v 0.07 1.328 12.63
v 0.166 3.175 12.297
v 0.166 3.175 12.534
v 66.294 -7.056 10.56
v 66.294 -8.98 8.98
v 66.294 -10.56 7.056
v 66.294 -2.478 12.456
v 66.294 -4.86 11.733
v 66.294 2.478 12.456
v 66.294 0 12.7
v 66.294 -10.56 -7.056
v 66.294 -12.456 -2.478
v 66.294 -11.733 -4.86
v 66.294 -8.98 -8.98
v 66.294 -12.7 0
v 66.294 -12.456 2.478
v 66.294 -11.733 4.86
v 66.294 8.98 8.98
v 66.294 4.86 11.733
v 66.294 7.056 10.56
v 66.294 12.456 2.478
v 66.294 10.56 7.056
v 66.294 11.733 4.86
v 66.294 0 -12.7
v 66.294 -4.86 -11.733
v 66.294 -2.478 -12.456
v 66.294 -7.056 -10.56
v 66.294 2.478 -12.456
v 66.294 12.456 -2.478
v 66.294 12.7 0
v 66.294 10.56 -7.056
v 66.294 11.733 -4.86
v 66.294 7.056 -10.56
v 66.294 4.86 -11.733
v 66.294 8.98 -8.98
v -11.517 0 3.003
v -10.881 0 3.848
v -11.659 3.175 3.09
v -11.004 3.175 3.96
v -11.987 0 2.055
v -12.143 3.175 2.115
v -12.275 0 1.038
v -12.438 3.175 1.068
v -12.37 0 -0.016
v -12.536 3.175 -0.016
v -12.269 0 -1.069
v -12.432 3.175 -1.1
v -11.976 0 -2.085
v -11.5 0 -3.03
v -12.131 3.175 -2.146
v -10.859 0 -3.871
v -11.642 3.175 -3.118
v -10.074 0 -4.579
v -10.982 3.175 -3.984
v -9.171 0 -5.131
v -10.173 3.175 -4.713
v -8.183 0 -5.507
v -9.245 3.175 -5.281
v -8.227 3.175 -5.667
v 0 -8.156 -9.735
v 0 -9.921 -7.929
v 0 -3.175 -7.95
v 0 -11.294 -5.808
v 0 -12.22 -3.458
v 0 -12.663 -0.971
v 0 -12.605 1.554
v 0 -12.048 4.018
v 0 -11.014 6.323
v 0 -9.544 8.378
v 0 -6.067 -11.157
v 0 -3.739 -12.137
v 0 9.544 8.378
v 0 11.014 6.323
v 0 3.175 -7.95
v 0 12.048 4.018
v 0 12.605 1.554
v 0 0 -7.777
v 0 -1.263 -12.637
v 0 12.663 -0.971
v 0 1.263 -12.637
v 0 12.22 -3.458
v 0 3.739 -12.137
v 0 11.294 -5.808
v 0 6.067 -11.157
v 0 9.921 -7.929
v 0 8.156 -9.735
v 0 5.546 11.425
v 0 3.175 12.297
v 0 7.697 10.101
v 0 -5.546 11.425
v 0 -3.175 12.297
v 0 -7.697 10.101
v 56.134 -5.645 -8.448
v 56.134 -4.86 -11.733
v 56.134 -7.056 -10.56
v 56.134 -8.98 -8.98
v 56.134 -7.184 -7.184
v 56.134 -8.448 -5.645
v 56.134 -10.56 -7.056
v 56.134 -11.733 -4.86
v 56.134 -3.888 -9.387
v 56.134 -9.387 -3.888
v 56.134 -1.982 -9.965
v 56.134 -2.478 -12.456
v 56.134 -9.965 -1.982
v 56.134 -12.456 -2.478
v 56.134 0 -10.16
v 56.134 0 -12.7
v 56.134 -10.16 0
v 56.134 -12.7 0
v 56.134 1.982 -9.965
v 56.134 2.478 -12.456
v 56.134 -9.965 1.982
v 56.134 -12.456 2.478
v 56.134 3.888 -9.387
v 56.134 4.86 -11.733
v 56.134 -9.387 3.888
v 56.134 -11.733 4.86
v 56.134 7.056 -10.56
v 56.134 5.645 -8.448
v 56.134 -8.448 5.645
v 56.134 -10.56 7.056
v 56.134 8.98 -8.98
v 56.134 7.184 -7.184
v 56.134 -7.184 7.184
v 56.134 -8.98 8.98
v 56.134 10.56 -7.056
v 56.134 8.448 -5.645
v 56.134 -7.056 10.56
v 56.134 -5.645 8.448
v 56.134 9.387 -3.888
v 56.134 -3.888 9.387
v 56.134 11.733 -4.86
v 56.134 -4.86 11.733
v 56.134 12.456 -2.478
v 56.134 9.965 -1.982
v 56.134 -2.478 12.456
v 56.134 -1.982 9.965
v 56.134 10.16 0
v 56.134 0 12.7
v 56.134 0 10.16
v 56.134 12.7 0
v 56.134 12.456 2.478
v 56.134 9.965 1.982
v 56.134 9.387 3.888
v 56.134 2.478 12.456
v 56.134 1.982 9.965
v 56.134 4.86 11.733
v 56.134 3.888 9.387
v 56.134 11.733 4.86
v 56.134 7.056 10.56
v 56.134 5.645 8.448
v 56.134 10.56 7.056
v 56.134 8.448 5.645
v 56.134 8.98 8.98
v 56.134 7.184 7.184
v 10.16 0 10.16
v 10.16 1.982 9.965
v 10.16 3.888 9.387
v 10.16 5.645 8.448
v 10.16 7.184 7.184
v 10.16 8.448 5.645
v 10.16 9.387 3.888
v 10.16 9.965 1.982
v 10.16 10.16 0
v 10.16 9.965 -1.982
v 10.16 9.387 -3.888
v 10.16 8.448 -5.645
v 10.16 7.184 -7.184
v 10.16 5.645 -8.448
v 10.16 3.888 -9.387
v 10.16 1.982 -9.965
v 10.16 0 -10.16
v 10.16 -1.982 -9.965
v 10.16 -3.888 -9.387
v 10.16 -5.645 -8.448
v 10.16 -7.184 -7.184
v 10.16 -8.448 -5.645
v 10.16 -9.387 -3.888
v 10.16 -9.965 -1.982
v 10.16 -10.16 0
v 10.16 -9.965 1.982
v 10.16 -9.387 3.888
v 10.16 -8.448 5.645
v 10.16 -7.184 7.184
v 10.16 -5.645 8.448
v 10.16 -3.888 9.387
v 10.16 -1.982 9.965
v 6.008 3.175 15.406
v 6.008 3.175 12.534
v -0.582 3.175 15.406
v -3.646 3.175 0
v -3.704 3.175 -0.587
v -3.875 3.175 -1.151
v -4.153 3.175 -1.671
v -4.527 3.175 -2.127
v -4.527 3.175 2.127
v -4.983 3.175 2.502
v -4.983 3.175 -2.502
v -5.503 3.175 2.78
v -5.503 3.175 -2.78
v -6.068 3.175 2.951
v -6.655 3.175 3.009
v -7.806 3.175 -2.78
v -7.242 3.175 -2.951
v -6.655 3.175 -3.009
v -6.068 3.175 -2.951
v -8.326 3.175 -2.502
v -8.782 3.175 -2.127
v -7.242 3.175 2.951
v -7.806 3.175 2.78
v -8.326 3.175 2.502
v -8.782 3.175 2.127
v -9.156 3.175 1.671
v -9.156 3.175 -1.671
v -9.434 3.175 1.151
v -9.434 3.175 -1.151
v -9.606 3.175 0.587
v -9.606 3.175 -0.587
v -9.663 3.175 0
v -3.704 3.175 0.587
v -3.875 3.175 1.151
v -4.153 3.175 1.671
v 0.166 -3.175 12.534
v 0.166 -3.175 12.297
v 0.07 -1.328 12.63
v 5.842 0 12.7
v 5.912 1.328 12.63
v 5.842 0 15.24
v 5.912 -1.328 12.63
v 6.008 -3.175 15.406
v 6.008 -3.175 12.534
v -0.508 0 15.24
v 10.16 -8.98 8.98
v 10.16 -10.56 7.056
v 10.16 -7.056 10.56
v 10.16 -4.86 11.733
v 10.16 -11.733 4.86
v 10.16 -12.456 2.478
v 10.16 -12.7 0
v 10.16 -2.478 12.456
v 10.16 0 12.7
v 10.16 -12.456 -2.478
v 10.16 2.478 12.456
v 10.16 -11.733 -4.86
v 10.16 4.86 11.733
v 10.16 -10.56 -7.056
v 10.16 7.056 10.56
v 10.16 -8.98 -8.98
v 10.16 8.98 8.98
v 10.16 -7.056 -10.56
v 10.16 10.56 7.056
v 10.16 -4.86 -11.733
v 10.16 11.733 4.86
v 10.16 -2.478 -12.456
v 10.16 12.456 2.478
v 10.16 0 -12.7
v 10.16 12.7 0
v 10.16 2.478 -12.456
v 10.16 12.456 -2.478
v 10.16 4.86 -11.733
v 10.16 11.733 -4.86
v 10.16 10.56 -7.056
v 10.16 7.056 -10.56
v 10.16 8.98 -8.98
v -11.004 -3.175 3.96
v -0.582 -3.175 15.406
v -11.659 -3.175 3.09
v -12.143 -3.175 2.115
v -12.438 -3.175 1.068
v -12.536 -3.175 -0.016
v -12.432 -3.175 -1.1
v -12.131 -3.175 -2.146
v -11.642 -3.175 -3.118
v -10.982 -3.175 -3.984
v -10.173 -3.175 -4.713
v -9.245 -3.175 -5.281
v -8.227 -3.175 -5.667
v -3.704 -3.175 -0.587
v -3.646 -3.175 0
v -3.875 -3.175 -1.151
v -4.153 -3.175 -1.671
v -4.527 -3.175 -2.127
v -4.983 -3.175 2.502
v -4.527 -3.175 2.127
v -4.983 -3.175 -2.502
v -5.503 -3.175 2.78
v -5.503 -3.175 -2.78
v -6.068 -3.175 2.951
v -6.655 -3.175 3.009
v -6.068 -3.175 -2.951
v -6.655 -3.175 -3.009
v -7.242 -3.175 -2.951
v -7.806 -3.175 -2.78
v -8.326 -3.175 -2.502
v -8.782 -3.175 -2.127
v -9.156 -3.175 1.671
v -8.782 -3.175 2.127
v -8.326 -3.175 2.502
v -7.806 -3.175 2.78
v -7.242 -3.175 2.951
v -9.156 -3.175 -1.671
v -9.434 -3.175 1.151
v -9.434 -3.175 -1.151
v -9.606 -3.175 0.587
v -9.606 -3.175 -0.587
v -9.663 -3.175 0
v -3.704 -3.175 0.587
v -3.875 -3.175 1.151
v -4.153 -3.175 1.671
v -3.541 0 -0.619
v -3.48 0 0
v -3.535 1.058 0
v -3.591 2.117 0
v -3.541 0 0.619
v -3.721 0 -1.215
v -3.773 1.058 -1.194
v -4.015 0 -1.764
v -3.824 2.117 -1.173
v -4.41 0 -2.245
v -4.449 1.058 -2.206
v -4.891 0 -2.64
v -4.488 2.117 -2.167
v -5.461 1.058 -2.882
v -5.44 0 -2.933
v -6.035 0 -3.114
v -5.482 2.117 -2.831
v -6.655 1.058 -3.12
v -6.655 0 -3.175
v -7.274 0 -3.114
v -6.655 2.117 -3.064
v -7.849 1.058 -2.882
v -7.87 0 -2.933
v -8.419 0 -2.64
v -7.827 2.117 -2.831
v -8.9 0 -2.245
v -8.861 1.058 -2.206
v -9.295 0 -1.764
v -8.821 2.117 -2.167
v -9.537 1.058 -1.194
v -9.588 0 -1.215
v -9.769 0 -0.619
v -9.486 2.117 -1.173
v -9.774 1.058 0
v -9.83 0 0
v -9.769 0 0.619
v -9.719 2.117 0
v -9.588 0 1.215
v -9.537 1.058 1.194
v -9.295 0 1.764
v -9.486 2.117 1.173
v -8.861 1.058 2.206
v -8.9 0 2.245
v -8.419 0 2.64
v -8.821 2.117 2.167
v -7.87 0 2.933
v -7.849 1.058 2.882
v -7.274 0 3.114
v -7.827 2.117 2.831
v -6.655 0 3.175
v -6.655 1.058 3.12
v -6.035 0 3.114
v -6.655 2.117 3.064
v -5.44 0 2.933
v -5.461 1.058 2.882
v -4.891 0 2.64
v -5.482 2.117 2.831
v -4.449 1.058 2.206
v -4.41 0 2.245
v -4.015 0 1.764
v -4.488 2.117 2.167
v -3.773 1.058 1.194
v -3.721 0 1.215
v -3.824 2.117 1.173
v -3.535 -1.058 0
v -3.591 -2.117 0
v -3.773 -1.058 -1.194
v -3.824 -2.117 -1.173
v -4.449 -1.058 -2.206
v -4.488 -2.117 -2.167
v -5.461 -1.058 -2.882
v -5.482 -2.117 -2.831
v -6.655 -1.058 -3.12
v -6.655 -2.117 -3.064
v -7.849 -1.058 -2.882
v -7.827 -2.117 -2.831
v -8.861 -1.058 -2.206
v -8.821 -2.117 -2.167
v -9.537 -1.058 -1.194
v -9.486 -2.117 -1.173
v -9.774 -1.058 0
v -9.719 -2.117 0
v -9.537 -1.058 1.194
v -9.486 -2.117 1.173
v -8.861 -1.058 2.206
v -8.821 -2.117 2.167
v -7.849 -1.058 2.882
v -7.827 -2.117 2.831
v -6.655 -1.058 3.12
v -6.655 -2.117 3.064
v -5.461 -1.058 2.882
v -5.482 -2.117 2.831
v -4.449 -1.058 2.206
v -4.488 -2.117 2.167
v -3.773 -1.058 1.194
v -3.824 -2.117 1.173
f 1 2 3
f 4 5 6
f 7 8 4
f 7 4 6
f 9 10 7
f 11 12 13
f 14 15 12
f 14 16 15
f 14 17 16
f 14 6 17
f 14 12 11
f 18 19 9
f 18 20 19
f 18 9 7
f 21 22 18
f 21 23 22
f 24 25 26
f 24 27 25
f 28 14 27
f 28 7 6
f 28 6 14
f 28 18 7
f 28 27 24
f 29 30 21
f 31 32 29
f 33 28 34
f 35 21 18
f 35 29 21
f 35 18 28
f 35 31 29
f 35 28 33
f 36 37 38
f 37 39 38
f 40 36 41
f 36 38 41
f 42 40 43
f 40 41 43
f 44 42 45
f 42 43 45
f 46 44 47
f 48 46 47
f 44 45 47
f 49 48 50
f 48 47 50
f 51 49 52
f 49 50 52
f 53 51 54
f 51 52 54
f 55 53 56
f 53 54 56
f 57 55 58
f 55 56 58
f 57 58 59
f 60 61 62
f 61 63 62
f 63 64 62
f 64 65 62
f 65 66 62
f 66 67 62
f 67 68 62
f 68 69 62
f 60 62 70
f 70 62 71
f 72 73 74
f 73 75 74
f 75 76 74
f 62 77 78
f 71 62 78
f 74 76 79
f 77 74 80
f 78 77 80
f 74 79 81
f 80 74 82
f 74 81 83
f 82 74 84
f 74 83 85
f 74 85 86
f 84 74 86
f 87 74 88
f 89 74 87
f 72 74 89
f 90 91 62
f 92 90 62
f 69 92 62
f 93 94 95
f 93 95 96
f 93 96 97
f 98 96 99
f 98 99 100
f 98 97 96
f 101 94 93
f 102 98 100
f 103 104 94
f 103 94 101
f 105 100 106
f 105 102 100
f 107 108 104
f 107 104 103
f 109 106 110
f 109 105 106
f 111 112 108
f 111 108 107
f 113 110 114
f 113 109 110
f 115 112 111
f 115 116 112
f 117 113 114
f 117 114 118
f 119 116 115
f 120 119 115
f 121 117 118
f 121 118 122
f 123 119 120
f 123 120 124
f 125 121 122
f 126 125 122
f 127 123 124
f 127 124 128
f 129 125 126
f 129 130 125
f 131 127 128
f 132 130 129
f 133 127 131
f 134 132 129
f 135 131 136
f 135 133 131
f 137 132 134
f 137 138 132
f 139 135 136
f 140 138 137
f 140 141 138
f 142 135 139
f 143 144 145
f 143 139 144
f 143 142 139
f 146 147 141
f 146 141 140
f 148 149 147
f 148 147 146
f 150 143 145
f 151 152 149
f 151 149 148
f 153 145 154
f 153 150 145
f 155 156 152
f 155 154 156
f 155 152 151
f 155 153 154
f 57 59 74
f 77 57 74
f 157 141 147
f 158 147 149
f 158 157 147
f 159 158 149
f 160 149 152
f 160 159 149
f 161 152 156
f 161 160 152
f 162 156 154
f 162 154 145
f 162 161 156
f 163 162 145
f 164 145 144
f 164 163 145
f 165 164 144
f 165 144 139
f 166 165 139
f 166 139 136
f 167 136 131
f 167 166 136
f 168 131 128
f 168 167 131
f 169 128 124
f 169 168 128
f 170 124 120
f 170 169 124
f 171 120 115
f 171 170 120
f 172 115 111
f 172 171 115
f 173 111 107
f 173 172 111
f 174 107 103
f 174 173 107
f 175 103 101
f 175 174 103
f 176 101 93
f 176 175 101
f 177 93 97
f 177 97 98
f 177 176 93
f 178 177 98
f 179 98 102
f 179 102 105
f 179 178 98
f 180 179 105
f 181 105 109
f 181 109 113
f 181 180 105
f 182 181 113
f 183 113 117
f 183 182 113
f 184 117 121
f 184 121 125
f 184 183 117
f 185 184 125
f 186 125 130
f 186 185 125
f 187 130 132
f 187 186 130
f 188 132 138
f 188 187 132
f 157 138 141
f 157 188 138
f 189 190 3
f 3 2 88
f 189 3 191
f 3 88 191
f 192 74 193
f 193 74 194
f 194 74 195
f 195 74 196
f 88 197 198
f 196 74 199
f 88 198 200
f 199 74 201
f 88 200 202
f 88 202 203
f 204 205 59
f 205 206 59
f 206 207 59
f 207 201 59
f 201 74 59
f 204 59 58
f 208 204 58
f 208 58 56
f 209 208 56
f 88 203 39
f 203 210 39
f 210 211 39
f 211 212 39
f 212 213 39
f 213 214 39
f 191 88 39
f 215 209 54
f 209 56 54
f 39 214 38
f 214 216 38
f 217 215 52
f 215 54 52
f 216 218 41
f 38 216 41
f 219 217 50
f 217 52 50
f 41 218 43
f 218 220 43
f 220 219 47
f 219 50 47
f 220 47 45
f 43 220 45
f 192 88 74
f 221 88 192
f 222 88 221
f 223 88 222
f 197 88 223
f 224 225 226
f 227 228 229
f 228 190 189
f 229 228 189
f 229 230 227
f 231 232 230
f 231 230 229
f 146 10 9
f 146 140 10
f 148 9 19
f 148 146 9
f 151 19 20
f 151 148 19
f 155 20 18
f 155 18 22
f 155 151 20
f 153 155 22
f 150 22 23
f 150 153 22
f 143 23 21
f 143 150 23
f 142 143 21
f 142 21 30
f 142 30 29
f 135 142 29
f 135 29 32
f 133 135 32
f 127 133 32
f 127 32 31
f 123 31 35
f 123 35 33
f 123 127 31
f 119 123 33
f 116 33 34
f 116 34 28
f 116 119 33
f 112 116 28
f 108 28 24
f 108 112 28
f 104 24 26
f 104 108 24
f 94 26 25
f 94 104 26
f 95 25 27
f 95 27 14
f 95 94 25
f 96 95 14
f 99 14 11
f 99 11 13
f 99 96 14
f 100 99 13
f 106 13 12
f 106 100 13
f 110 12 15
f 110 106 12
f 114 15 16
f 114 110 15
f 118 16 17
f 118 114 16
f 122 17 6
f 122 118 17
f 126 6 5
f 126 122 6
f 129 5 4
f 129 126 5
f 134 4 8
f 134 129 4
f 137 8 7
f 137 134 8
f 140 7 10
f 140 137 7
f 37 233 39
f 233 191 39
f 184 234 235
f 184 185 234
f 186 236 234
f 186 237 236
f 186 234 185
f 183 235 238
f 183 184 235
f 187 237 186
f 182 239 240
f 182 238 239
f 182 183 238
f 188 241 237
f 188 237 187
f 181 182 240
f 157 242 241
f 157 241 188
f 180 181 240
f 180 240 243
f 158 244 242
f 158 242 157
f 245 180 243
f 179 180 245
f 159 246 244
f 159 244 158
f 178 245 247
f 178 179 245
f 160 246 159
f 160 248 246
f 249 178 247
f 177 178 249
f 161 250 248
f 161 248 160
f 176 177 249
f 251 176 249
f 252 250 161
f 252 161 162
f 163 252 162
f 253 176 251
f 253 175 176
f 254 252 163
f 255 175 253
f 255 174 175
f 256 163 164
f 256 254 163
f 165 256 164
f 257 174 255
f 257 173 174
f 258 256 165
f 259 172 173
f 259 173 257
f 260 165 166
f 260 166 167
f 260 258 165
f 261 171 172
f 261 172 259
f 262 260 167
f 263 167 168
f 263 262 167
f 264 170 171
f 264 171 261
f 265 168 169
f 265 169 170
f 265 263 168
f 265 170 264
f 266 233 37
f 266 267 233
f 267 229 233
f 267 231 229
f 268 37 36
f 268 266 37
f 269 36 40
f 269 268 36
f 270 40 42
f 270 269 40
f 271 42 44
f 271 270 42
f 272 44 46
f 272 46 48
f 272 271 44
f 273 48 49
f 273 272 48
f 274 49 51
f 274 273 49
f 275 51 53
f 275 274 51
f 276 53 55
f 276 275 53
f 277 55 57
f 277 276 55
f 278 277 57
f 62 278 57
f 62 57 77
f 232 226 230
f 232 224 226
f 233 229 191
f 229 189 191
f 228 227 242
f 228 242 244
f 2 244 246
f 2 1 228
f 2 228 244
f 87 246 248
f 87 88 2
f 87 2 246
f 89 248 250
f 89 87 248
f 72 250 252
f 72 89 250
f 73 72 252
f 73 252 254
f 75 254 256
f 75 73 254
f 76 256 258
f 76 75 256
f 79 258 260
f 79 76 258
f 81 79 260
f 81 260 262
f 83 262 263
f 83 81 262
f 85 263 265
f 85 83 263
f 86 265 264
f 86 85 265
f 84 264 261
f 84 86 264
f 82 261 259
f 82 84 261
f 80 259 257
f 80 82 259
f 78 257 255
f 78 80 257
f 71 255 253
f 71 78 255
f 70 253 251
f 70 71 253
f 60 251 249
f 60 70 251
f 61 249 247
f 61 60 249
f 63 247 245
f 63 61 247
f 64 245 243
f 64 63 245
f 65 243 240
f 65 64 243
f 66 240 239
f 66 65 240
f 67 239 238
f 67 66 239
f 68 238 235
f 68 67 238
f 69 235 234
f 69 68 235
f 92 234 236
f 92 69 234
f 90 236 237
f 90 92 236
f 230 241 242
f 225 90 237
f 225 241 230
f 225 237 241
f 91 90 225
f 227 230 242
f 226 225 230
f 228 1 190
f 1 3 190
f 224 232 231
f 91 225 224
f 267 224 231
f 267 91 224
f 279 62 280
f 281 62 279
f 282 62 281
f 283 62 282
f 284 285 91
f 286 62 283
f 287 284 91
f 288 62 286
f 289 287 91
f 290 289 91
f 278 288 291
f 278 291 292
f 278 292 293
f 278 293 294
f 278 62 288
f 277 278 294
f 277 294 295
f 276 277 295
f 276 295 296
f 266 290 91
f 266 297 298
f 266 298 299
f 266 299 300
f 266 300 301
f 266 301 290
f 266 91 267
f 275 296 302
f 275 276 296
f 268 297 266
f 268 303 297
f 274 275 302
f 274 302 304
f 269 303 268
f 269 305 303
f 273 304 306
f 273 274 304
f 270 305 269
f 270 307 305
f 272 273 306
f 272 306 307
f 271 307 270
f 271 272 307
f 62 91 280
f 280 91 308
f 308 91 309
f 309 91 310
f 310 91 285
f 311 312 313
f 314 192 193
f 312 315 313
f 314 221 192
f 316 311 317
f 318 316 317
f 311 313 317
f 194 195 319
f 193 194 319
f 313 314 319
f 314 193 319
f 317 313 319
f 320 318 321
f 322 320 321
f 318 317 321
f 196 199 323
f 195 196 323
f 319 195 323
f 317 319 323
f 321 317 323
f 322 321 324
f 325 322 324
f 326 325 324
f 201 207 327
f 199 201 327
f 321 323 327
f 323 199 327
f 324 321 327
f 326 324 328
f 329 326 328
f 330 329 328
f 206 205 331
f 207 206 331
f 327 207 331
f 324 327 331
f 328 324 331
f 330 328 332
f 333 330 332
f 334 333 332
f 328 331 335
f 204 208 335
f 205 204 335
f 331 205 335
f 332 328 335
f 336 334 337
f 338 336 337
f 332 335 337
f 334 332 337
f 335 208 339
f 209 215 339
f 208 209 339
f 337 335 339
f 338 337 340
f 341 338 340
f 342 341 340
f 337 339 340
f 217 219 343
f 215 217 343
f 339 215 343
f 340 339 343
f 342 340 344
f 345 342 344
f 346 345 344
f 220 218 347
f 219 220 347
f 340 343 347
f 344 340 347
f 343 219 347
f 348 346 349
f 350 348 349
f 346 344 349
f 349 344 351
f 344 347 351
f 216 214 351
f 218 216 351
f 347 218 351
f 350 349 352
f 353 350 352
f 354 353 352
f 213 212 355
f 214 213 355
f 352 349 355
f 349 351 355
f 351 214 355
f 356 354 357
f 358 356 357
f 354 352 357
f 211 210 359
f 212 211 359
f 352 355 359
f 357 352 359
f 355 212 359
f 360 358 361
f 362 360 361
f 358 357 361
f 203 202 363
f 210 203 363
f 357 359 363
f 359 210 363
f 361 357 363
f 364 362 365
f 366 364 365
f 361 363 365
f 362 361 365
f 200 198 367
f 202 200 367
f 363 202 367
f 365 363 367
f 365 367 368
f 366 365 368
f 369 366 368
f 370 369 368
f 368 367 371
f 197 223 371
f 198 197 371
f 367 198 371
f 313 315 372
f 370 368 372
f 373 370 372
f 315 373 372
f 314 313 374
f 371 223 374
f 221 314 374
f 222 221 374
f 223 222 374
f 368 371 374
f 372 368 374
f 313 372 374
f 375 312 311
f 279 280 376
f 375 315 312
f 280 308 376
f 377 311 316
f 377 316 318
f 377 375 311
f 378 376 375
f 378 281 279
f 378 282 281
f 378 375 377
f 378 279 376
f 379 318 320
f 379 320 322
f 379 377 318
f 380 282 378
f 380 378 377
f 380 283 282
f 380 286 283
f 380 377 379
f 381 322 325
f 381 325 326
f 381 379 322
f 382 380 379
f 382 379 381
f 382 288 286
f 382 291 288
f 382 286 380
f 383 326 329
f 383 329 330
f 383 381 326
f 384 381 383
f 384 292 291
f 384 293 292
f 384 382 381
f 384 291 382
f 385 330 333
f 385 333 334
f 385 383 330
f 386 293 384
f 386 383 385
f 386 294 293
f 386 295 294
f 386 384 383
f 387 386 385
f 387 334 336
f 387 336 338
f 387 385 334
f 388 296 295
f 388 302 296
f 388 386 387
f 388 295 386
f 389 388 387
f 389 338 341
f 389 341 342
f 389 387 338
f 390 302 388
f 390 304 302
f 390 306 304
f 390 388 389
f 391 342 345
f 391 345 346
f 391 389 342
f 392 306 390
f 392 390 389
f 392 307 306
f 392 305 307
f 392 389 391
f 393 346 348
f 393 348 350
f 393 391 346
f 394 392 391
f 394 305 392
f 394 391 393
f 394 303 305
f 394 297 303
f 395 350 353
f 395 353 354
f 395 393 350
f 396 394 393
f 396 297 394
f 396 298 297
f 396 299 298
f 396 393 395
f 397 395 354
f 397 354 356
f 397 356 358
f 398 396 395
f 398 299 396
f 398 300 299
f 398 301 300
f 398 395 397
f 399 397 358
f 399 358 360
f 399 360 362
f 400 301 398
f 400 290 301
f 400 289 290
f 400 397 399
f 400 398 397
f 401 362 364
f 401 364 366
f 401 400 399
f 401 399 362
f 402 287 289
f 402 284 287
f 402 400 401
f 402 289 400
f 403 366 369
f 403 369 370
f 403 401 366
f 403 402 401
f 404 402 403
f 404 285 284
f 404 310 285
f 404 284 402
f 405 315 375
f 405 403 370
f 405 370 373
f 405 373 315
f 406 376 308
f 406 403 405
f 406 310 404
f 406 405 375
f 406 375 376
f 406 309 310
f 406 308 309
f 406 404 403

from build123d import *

# Parameters (mm, degrees)
F0_W     = 5.842
F0_H     = 12.7
F0_R     = 3.175
F2_DEPTH = 3.175
F2_TAPER = -3


# Not quite as in the source:
# - a feature names something its author has since deleted; it is built from what else it names


with BuildPart() as f1:
    # F0 (on Front) → F1 (revolve)
    with BuildSketch(Plane.XZ):
        with Locations((2.921, 6.35)):
            Rectangle(F0_W, F0_H)
        Polygon((5.842, 12.7), (5.842, 0), (66.294, 0), (66.294, 12.7), (56.134, 12.7), (56.134, 10.16), (10.16, 10.16), (10.16, 12.7), align=None)
    revolve(axis=Axis((33.147, 0, 0), (-1, 0, 0)))

    # F0 (on Front) → F2 (join, symmetric)
    with BuildSketch(Plane.XZ):
        with BuildLine():
            Line((-0.9398, 0), (0, 0))
            Line((0, 0), (0, 12.7))
            Line((0, 12.7), (5.842, 12.7))
            Line((5.842, 12.7), (5.842, 15.24))
            Line((5.842, 15.24), (-0.508, 15.24))
            Line((-0.508, 15.24), (-10.8806298187, 3.8475430269))
            ThreePointArc((-10.8806298187, 3.8475430269), (-4.5919612295, 5.3297205562), (-0.9398, 0))
        make_face()
        with BuildLine():
            ThreePointArc((-8.1826630726, -5.5069827884), (-3.1957909266, -4.5493385486), (-0.9398, 0))
            ThreePointArc((-0.9398, 0), (-4.5919612295, 5.3297205562), (-10.8806298187, 3.8475430269))
            ThreePointArc((-10.8806298187, 3.8475430269), (-12.1459778134, -1.5837270034), (-8.1826630726, -5.5069827884))
        make_face()
        with Locations((-6.6548, 0)):
            Circle(F0_R, mode=Mode.SUBTRACT)
        with BuildLine():
            Line((5.842, 0), (0, 0))
            Line((0, 0), (-0.9398, 0))
            ThreePointArc((-0.9398, 0), (-3.1957909266, -4.5493385486), (-8.1826630726, -5.5069827884))
            Line((-8.1826630726, -5.5069827884), (5.842, -9.398))
            Line((5.842, -9.398), (5.842, 0))
        make_face()
    extrude(amount=F2_DEPTH, both=True, taper=F2_TAPER)


solid = f1.part
